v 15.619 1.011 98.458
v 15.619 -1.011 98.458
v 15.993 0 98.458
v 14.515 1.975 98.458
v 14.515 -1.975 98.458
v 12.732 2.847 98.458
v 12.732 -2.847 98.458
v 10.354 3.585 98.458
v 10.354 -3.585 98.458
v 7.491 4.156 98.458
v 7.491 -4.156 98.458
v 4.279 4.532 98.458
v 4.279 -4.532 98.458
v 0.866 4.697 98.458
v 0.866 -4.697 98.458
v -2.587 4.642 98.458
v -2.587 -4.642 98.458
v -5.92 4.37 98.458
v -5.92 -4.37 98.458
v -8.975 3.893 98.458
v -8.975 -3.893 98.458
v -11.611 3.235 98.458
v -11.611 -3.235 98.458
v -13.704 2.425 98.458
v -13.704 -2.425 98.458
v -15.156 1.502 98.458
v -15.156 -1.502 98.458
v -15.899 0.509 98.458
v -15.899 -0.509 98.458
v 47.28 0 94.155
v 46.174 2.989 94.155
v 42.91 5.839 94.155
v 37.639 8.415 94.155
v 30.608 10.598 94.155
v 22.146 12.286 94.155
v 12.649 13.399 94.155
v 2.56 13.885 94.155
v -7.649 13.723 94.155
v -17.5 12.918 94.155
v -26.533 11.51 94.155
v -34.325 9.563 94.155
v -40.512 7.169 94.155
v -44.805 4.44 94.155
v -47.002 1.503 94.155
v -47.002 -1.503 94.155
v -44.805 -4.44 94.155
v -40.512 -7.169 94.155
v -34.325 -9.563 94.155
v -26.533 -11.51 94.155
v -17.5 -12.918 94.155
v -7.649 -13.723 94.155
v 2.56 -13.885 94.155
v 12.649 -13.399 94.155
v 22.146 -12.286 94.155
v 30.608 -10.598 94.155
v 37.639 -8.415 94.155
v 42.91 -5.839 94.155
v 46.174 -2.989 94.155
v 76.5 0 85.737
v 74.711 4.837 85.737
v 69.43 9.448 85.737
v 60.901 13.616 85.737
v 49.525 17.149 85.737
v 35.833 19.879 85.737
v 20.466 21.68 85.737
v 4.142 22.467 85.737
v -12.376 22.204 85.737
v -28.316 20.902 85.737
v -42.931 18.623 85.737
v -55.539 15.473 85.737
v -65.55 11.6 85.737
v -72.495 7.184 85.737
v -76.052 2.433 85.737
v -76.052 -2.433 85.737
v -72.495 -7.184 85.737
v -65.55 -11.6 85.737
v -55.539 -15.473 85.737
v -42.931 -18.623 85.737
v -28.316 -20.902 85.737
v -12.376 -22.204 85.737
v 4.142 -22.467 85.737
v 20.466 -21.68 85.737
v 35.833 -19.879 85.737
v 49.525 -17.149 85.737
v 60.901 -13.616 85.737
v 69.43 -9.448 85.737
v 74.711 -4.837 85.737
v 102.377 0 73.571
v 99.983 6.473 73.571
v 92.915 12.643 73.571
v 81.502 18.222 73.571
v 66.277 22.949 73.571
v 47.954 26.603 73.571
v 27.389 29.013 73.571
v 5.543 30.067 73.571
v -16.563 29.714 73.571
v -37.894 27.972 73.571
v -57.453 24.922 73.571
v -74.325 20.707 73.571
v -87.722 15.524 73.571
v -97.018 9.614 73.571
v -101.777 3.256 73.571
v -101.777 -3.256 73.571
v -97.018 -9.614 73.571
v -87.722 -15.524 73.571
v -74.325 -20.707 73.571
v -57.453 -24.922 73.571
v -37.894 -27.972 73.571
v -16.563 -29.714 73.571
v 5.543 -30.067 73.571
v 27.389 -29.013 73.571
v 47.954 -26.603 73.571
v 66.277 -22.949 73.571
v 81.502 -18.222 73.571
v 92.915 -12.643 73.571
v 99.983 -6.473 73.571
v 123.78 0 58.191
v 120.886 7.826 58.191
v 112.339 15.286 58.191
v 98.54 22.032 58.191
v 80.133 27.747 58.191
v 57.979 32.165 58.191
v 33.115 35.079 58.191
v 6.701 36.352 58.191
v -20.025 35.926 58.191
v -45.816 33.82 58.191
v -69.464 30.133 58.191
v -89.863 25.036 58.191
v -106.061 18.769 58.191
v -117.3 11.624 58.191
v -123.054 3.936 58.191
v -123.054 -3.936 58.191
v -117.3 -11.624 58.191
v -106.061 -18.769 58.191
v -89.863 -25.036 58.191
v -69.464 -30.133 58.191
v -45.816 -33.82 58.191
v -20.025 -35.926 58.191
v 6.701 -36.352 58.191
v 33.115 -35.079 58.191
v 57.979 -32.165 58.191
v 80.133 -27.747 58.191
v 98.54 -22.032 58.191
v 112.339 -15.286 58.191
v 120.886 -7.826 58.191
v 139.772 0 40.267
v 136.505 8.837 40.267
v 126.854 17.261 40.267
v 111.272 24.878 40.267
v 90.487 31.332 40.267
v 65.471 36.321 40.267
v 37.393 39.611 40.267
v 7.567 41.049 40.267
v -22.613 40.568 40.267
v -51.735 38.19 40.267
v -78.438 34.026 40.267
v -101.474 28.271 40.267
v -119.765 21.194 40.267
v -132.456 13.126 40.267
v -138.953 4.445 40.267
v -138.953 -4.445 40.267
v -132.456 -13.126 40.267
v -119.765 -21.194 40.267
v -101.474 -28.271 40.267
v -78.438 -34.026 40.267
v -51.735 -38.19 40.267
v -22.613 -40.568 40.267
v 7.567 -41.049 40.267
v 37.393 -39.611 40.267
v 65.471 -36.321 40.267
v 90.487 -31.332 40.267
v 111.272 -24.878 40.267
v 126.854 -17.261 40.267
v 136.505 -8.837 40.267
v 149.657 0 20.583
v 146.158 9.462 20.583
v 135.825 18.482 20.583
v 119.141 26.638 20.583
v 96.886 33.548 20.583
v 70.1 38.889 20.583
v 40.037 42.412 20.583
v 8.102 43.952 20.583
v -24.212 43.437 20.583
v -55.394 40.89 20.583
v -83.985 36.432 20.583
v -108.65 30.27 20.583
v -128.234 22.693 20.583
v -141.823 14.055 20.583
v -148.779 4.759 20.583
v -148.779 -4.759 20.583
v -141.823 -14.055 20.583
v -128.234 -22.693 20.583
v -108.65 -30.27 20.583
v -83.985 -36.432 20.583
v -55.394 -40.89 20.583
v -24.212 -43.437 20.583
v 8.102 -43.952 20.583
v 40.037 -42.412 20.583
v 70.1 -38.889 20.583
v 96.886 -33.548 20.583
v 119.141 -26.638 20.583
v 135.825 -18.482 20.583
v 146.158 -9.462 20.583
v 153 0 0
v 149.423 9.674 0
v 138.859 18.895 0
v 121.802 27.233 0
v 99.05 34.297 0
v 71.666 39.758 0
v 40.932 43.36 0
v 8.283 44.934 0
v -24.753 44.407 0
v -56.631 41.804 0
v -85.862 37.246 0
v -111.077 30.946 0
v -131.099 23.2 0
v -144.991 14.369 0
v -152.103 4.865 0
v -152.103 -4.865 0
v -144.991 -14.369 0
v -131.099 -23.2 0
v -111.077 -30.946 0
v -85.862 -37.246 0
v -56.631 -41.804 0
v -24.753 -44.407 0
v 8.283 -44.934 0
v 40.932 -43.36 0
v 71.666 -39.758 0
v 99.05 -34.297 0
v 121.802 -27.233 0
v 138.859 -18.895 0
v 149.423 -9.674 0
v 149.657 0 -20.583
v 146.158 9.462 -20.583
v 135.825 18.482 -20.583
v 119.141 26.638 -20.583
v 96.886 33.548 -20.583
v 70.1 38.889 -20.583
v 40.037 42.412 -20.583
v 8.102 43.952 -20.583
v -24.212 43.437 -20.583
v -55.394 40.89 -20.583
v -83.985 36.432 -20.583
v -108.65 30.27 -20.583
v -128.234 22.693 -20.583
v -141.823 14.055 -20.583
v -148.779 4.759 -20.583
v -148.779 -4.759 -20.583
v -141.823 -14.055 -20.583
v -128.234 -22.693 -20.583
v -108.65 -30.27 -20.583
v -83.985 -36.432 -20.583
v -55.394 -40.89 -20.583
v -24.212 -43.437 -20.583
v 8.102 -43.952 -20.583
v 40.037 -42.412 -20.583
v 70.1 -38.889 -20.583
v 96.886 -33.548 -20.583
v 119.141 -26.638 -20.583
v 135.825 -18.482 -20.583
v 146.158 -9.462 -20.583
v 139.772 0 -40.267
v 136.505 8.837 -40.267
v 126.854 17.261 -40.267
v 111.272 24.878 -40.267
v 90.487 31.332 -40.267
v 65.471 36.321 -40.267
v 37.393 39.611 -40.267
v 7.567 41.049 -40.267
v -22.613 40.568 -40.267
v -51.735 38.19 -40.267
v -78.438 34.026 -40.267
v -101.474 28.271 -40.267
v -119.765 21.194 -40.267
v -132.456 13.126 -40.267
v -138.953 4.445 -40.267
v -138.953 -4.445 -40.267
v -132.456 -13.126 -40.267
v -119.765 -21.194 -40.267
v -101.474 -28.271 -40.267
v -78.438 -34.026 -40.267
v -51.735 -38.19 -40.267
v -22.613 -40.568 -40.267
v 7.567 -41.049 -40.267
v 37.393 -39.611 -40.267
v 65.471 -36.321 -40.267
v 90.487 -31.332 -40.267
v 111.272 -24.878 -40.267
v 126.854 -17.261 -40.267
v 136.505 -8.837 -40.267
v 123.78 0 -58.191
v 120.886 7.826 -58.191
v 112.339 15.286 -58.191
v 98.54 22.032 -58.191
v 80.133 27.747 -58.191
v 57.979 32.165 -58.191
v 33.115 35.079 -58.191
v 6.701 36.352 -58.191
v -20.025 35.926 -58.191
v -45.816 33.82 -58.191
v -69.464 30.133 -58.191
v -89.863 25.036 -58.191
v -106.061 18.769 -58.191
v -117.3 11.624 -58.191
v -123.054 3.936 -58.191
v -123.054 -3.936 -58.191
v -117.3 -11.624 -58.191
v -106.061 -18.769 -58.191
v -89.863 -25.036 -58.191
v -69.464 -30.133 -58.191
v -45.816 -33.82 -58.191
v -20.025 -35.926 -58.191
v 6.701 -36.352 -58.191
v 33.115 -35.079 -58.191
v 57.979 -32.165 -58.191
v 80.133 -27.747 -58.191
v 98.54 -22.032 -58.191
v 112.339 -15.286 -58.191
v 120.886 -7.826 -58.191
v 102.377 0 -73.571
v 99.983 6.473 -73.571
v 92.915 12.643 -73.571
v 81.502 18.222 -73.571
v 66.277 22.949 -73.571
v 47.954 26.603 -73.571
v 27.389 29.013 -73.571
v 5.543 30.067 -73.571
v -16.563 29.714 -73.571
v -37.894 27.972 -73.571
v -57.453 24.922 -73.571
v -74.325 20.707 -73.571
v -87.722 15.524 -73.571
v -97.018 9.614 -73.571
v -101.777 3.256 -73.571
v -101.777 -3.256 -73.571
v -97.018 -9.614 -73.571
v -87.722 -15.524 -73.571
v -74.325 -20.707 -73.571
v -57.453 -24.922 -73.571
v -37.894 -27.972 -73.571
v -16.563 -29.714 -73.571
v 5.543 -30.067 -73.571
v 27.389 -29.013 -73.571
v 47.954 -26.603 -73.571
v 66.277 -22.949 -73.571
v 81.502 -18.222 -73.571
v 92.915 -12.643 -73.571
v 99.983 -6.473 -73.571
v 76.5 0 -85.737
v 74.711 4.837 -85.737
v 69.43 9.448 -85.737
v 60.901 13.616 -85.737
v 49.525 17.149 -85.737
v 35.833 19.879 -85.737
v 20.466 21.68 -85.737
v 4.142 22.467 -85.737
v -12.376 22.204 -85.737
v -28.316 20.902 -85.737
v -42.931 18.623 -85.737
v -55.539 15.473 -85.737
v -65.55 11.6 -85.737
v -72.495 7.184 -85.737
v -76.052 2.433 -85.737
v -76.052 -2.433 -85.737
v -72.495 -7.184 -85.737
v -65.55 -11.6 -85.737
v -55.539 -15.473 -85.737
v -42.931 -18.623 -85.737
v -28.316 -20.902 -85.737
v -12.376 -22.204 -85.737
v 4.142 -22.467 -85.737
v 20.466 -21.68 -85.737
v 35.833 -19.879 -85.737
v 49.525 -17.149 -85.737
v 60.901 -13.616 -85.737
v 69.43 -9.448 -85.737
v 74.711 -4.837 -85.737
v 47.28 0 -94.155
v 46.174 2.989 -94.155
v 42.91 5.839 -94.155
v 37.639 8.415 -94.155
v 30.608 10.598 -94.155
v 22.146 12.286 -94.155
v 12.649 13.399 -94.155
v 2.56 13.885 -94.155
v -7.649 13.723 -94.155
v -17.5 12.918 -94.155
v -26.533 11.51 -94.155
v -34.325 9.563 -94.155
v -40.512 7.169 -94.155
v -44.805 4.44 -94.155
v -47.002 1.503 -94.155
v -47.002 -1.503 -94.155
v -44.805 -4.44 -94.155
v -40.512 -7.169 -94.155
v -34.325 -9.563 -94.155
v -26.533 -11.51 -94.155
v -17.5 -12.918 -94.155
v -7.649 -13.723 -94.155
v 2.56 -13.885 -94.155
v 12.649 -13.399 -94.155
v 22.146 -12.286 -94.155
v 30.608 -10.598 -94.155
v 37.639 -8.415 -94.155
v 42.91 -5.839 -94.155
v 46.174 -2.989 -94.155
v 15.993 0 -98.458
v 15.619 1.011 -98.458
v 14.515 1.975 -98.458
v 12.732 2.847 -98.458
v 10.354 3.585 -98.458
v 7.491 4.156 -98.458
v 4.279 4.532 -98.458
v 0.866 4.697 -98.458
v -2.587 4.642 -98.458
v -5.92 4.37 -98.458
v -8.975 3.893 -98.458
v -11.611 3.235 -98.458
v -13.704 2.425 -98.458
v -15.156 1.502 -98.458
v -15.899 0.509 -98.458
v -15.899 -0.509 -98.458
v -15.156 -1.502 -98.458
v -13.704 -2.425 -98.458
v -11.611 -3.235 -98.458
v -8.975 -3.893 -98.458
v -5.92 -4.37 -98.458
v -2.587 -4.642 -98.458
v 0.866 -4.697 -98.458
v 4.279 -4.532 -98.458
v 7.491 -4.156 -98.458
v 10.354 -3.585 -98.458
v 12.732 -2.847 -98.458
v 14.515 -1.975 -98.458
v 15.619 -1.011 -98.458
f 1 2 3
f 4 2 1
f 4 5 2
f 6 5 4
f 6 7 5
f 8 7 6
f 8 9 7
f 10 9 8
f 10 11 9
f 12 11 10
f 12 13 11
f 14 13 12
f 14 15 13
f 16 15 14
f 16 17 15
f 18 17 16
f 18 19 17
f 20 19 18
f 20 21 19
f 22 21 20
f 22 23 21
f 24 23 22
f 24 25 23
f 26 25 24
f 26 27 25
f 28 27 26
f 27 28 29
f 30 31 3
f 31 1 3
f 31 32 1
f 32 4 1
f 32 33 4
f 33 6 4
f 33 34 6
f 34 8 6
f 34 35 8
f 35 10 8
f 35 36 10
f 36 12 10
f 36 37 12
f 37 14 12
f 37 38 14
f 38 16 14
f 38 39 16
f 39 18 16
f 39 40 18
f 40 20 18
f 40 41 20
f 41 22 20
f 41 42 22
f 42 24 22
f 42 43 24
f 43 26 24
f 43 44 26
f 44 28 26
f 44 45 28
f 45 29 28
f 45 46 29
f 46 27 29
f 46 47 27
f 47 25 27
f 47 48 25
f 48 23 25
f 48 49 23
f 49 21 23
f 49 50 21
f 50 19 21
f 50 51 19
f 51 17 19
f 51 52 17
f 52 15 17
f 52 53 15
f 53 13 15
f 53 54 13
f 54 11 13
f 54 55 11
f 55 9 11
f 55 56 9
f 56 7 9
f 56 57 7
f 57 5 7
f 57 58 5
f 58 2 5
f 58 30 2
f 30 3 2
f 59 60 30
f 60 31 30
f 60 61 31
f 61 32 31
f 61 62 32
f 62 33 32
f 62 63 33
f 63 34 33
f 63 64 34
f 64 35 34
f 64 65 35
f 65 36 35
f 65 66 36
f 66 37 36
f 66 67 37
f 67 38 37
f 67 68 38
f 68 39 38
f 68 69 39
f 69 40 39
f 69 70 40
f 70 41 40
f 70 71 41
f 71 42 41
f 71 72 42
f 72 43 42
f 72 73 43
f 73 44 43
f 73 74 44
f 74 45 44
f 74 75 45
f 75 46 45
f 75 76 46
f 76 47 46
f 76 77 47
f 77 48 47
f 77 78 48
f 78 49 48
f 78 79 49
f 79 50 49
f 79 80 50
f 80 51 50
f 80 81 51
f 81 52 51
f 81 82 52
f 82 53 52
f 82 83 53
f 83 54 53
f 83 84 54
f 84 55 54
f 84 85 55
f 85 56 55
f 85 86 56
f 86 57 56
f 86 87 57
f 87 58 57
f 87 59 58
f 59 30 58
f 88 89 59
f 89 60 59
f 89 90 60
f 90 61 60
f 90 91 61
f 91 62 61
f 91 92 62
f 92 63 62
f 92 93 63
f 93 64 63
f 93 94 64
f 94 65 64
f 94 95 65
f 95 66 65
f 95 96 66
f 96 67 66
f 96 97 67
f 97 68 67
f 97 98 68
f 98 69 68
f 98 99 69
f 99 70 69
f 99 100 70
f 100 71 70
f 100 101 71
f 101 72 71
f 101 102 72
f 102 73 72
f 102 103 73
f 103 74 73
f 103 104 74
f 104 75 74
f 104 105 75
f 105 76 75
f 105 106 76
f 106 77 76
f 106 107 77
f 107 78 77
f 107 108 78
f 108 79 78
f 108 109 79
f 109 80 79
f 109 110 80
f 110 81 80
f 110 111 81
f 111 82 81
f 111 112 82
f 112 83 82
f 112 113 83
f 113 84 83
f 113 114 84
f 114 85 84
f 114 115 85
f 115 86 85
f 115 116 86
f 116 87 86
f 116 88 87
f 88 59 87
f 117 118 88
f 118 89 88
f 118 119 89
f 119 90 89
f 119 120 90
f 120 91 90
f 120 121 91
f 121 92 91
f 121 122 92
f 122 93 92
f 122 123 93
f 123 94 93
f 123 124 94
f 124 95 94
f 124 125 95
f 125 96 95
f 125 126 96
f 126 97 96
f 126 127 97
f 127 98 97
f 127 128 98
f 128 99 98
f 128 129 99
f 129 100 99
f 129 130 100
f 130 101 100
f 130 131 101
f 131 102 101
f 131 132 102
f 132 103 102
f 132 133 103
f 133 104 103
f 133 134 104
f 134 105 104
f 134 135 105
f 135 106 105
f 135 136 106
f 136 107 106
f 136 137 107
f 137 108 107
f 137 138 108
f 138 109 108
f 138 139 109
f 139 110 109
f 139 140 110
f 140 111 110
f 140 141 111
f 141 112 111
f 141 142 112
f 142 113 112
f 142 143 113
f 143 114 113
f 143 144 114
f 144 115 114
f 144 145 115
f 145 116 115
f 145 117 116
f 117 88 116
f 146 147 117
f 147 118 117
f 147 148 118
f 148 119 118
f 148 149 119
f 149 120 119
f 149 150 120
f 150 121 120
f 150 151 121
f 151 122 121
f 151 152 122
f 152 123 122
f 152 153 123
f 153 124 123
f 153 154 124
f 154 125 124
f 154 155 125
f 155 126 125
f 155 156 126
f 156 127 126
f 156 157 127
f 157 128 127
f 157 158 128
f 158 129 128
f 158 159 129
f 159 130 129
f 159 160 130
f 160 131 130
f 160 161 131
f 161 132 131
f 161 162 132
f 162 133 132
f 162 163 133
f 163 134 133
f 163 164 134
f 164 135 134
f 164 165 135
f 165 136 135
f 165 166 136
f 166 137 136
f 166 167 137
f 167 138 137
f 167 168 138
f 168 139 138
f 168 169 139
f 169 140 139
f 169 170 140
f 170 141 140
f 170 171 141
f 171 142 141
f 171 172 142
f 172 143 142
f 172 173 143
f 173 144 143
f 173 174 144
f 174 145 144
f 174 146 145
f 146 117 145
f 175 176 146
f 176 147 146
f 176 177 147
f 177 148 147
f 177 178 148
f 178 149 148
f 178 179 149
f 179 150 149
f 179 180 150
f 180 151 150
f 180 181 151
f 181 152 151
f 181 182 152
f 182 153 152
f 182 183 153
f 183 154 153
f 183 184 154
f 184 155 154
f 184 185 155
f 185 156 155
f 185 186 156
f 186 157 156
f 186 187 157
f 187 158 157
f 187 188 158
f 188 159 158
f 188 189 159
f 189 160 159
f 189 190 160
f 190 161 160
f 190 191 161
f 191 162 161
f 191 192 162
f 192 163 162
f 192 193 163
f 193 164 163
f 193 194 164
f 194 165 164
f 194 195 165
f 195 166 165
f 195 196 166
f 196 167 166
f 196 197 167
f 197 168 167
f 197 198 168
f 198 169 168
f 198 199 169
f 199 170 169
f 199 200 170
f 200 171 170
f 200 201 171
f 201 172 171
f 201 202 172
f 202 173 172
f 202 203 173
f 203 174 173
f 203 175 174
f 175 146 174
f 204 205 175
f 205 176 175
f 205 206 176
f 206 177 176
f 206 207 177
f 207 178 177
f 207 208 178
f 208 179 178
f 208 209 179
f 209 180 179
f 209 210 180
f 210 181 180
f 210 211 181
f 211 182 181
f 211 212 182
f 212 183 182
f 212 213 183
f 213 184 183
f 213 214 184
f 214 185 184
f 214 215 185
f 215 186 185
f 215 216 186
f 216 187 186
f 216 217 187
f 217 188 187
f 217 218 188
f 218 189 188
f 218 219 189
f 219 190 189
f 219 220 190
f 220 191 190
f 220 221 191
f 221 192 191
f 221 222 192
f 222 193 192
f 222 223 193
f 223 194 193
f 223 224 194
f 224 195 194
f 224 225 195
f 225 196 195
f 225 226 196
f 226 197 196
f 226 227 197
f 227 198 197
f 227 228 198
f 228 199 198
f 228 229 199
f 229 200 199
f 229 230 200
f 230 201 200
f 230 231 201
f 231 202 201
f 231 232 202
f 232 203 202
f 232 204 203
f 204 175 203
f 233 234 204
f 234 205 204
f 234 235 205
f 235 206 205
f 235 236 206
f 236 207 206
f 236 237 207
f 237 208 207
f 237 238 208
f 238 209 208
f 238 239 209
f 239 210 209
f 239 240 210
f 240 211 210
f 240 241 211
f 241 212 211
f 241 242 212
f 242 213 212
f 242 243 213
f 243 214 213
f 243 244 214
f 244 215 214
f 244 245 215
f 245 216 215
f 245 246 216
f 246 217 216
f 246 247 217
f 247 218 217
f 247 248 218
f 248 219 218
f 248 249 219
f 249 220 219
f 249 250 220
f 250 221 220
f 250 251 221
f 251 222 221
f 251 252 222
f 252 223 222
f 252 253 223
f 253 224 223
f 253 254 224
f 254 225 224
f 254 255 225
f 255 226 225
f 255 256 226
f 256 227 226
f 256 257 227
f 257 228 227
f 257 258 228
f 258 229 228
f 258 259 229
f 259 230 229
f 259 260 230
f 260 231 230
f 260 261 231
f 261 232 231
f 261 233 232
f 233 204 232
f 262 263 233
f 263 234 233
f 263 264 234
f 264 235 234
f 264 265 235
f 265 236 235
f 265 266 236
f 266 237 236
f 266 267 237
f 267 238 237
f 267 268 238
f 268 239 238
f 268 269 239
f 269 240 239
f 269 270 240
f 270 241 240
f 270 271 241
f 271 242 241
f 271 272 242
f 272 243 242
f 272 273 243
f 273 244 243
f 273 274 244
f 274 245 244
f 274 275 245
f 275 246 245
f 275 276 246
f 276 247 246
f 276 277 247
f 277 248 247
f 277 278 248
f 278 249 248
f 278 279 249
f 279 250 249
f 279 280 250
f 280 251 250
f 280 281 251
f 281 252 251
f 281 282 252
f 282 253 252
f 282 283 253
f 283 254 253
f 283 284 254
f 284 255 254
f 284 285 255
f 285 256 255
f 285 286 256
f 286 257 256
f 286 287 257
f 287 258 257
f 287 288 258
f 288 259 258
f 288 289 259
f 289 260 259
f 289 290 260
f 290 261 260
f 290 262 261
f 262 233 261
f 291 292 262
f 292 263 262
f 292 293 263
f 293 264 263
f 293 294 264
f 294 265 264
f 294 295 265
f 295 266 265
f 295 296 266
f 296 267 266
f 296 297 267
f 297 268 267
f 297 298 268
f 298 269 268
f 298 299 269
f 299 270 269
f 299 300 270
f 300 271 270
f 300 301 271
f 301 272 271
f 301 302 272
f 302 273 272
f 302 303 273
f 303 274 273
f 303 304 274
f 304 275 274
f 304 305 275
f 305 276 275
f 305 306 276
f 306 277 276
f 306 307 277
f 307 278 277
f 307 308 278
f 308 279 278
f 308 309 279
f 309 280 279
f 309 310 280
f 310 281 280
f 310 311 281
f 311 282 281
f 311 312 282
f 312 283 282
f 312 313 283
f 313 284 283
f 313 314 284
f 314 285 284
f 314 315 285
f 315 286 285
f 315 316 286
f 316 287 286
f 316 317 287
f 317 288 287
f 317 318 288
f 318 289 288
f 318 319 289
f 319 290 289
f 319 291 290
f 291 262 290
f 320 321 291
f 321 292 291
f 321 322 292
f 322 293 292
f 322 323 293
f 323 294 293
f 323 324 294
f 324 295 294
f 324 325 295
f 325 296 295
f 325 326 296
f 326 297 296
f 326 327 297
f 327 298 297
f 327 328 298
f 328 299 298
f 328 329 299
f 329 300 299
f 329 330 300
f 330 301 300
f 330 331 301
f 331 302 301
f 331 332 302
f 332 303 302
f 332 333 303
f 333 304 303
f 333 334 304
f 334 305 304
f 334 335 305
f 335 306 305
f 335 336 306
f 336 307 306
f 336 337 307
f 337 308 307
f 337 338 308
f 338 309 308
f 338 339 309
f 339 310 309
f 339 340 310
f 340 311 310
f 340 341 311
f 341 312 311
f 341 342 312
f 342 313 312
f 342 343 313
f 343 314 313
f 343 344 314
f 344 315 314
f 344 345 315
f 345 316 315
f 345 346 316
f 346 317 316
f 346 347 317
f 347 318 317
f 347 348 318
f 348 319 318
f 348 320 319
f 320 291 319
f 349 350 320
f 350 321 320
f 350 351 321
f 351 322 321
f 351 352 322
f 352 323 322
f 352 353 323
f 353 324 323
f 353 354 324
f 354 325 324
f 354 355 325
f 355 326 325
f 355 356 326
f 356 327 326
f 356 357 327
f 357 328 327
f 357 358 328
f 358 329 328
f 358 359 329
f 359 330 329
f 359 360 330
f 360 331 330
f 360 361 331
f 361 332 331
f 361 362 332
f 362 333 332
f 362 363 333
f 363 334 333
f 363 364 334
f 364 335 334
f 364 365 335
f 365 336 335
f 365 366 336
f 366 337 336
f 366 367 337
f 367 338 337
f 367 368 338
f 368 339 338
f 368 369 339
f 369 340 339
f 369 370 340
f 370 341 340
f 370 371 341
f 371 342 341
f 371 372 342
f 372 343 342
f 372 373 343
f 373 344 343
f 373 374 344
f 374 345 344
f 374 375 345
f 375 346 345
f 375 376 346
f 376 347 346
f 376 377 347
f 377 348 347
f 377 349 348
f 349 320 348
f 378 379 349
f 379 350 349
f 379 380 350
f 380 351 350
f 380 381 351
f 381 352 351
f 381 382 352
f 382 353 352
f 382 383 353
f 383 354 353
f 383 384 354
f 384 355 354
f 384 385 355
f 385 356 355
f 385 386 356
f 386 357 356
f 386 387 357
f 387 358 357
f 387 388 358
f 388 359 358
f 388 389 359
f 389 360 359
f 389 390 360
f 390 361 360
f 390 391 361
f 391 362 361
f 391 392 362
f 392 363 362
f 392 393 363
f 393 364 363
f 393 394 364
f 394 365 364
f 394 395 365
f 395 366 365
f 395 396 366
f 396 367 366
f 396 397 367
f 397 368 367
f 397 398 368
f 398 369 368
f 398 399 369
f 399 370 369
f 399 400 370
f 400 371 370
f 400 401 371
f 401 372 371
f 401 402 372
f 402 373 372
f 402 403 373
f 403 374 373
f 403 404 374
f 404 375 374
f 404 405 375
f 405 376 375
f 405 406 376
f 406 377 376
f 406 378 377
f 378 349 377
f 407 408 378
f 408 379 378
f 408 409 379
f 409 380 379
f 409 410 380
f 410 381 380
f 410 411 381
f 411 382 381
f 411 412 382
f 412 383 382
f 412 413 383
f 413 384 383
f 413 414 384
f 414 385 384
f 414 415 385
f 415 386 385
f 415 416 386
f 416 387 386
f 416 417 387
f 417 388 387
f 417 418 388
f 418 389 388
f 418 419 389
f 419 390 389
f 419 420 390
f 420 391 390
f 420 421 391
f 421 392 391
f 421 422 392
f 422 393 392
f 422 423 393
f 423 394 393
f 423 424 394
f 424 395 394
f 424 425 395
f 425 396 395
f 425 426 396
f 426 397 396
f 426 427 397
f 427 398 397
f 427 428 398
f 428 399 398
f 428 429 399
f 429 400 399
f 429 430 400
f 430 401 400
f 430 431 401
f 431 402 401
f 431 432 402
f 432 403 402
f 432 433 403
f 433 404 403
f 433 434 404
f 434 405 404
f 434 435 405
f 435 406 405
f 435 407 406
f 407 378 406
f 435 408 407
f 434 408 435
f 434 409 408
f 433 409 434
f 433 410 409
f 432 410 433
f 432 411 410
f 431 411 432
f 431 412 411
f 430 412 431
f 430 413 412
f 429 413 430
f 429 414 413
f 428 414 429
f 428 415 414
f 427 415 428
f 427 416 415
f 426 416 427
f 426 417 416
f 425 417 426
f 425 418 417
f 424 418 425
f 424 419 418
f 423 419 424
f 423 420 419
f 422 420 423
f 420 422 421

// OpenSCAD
// Generated by SolidPython 1.0.1 on 2020-07-29 00:46:52


scale(v = [17, 5, 11]) {
	sphere(r = 9);
}
/***********************************************
*********      SolidPython code:      **********
************************************************
 
# import packages: SolidPython
from solid import *
from solid.utils import *
from itertools import chain, combinations, permutations


class Resize:

    def __init__(self, scad_file):
        self.scad_file = scad_file
        #self.scad_file = import_scad(scad_file)
        # cone/cylinder param:
        self.r1 = 0
        self.r2 = 0
        self.h = 0
        # rectangular prism param:
        self.w = 0
        self.l = 0
        # ellipse param:
        self.r = 0

    # import OpenScad code (file name corresponds to shape)


    # classify shape + parameters
    def assign(self, param1, param2, param3):
        if self.scad_file == 'cone.scad':
            self.r1 = param1
            self.r2 = param2
            self.h = param3
        elif self.scad_file == 'cylinder.scad':
            self.r1 = param1
            self.r2 = param2
            self.h = param3
        elif self.scad_file == 'rectangularPrism.scad':
            self.h = param1
            self.l = param2
            self.w = param3
        else:
            self.r = param1
            self.h = param2

    # resize parameters
    def iterate(self):
        x = range(3, 20, 2)
        i = 1
        if self.scad_file == 'cone.scad':
            tempList = list(permutations(x, 2))
            for temp in tempList:
                param1 = temp[0]
                param2 = temp[1]
                filepath = 'produced_scad_files/' + 'cone' + str(param1) + '_' + str(param2) + '_' + '.scad'
                scad_render_to_file(cylinder(h=param1, r1=param2, r2=0), filepath)

        elif self.scad_file == 'cylinder.scad':
            tempList = list(permutations(x, 3))
            for temp in tempList:
                param1 = temp[0]
                param2 = temp[1]
                filepath = 'produced_scad_files/' + 'cylinder' + str(param1) + '_' + str(param2) + '_' + '.scad'
                scad_render_to_file(cylinder(h=param1, r1=param2, r2=param2), filepath)

        elif self.scad_file == 'rectangularPrism.scad':
            tempList = list(permutations(x, 3))
            for temp in tempList:
                param1 = temp[0]
                param2 = temp[1]
                param3 = temp[2]
                filepath = 'produced_scad_files/' + 'rectangularPrism' + str(param1) + '_' + str(param2) + '_' + str(
                    param3) + '.scad'
                scad_render_to_file(cube(size=(param1, param2, param3)), filepath)

        elif self.scad_file == 'ellipse.scad':
            tempList = list(permutations(x, 4))
            for temp in tempList:
                param1 = temp[0]
                param2 = temp[1]
                param3 = temp[2]
                param4 = temp[3]
                filepath = 'produced_scad_files/' + 'ellipse' + str(param1) + '_' + str(param2) + '_' + str(param3) + '_' + str(param4) + '.scad'
                scad_render_to_file(scale([param1, param2, param3])(sphere(r=param4)), filepath)

    def render_to_scadfile(self):
        scad_render_to_file(scad, 'example.scad') 
 
************************************************/
